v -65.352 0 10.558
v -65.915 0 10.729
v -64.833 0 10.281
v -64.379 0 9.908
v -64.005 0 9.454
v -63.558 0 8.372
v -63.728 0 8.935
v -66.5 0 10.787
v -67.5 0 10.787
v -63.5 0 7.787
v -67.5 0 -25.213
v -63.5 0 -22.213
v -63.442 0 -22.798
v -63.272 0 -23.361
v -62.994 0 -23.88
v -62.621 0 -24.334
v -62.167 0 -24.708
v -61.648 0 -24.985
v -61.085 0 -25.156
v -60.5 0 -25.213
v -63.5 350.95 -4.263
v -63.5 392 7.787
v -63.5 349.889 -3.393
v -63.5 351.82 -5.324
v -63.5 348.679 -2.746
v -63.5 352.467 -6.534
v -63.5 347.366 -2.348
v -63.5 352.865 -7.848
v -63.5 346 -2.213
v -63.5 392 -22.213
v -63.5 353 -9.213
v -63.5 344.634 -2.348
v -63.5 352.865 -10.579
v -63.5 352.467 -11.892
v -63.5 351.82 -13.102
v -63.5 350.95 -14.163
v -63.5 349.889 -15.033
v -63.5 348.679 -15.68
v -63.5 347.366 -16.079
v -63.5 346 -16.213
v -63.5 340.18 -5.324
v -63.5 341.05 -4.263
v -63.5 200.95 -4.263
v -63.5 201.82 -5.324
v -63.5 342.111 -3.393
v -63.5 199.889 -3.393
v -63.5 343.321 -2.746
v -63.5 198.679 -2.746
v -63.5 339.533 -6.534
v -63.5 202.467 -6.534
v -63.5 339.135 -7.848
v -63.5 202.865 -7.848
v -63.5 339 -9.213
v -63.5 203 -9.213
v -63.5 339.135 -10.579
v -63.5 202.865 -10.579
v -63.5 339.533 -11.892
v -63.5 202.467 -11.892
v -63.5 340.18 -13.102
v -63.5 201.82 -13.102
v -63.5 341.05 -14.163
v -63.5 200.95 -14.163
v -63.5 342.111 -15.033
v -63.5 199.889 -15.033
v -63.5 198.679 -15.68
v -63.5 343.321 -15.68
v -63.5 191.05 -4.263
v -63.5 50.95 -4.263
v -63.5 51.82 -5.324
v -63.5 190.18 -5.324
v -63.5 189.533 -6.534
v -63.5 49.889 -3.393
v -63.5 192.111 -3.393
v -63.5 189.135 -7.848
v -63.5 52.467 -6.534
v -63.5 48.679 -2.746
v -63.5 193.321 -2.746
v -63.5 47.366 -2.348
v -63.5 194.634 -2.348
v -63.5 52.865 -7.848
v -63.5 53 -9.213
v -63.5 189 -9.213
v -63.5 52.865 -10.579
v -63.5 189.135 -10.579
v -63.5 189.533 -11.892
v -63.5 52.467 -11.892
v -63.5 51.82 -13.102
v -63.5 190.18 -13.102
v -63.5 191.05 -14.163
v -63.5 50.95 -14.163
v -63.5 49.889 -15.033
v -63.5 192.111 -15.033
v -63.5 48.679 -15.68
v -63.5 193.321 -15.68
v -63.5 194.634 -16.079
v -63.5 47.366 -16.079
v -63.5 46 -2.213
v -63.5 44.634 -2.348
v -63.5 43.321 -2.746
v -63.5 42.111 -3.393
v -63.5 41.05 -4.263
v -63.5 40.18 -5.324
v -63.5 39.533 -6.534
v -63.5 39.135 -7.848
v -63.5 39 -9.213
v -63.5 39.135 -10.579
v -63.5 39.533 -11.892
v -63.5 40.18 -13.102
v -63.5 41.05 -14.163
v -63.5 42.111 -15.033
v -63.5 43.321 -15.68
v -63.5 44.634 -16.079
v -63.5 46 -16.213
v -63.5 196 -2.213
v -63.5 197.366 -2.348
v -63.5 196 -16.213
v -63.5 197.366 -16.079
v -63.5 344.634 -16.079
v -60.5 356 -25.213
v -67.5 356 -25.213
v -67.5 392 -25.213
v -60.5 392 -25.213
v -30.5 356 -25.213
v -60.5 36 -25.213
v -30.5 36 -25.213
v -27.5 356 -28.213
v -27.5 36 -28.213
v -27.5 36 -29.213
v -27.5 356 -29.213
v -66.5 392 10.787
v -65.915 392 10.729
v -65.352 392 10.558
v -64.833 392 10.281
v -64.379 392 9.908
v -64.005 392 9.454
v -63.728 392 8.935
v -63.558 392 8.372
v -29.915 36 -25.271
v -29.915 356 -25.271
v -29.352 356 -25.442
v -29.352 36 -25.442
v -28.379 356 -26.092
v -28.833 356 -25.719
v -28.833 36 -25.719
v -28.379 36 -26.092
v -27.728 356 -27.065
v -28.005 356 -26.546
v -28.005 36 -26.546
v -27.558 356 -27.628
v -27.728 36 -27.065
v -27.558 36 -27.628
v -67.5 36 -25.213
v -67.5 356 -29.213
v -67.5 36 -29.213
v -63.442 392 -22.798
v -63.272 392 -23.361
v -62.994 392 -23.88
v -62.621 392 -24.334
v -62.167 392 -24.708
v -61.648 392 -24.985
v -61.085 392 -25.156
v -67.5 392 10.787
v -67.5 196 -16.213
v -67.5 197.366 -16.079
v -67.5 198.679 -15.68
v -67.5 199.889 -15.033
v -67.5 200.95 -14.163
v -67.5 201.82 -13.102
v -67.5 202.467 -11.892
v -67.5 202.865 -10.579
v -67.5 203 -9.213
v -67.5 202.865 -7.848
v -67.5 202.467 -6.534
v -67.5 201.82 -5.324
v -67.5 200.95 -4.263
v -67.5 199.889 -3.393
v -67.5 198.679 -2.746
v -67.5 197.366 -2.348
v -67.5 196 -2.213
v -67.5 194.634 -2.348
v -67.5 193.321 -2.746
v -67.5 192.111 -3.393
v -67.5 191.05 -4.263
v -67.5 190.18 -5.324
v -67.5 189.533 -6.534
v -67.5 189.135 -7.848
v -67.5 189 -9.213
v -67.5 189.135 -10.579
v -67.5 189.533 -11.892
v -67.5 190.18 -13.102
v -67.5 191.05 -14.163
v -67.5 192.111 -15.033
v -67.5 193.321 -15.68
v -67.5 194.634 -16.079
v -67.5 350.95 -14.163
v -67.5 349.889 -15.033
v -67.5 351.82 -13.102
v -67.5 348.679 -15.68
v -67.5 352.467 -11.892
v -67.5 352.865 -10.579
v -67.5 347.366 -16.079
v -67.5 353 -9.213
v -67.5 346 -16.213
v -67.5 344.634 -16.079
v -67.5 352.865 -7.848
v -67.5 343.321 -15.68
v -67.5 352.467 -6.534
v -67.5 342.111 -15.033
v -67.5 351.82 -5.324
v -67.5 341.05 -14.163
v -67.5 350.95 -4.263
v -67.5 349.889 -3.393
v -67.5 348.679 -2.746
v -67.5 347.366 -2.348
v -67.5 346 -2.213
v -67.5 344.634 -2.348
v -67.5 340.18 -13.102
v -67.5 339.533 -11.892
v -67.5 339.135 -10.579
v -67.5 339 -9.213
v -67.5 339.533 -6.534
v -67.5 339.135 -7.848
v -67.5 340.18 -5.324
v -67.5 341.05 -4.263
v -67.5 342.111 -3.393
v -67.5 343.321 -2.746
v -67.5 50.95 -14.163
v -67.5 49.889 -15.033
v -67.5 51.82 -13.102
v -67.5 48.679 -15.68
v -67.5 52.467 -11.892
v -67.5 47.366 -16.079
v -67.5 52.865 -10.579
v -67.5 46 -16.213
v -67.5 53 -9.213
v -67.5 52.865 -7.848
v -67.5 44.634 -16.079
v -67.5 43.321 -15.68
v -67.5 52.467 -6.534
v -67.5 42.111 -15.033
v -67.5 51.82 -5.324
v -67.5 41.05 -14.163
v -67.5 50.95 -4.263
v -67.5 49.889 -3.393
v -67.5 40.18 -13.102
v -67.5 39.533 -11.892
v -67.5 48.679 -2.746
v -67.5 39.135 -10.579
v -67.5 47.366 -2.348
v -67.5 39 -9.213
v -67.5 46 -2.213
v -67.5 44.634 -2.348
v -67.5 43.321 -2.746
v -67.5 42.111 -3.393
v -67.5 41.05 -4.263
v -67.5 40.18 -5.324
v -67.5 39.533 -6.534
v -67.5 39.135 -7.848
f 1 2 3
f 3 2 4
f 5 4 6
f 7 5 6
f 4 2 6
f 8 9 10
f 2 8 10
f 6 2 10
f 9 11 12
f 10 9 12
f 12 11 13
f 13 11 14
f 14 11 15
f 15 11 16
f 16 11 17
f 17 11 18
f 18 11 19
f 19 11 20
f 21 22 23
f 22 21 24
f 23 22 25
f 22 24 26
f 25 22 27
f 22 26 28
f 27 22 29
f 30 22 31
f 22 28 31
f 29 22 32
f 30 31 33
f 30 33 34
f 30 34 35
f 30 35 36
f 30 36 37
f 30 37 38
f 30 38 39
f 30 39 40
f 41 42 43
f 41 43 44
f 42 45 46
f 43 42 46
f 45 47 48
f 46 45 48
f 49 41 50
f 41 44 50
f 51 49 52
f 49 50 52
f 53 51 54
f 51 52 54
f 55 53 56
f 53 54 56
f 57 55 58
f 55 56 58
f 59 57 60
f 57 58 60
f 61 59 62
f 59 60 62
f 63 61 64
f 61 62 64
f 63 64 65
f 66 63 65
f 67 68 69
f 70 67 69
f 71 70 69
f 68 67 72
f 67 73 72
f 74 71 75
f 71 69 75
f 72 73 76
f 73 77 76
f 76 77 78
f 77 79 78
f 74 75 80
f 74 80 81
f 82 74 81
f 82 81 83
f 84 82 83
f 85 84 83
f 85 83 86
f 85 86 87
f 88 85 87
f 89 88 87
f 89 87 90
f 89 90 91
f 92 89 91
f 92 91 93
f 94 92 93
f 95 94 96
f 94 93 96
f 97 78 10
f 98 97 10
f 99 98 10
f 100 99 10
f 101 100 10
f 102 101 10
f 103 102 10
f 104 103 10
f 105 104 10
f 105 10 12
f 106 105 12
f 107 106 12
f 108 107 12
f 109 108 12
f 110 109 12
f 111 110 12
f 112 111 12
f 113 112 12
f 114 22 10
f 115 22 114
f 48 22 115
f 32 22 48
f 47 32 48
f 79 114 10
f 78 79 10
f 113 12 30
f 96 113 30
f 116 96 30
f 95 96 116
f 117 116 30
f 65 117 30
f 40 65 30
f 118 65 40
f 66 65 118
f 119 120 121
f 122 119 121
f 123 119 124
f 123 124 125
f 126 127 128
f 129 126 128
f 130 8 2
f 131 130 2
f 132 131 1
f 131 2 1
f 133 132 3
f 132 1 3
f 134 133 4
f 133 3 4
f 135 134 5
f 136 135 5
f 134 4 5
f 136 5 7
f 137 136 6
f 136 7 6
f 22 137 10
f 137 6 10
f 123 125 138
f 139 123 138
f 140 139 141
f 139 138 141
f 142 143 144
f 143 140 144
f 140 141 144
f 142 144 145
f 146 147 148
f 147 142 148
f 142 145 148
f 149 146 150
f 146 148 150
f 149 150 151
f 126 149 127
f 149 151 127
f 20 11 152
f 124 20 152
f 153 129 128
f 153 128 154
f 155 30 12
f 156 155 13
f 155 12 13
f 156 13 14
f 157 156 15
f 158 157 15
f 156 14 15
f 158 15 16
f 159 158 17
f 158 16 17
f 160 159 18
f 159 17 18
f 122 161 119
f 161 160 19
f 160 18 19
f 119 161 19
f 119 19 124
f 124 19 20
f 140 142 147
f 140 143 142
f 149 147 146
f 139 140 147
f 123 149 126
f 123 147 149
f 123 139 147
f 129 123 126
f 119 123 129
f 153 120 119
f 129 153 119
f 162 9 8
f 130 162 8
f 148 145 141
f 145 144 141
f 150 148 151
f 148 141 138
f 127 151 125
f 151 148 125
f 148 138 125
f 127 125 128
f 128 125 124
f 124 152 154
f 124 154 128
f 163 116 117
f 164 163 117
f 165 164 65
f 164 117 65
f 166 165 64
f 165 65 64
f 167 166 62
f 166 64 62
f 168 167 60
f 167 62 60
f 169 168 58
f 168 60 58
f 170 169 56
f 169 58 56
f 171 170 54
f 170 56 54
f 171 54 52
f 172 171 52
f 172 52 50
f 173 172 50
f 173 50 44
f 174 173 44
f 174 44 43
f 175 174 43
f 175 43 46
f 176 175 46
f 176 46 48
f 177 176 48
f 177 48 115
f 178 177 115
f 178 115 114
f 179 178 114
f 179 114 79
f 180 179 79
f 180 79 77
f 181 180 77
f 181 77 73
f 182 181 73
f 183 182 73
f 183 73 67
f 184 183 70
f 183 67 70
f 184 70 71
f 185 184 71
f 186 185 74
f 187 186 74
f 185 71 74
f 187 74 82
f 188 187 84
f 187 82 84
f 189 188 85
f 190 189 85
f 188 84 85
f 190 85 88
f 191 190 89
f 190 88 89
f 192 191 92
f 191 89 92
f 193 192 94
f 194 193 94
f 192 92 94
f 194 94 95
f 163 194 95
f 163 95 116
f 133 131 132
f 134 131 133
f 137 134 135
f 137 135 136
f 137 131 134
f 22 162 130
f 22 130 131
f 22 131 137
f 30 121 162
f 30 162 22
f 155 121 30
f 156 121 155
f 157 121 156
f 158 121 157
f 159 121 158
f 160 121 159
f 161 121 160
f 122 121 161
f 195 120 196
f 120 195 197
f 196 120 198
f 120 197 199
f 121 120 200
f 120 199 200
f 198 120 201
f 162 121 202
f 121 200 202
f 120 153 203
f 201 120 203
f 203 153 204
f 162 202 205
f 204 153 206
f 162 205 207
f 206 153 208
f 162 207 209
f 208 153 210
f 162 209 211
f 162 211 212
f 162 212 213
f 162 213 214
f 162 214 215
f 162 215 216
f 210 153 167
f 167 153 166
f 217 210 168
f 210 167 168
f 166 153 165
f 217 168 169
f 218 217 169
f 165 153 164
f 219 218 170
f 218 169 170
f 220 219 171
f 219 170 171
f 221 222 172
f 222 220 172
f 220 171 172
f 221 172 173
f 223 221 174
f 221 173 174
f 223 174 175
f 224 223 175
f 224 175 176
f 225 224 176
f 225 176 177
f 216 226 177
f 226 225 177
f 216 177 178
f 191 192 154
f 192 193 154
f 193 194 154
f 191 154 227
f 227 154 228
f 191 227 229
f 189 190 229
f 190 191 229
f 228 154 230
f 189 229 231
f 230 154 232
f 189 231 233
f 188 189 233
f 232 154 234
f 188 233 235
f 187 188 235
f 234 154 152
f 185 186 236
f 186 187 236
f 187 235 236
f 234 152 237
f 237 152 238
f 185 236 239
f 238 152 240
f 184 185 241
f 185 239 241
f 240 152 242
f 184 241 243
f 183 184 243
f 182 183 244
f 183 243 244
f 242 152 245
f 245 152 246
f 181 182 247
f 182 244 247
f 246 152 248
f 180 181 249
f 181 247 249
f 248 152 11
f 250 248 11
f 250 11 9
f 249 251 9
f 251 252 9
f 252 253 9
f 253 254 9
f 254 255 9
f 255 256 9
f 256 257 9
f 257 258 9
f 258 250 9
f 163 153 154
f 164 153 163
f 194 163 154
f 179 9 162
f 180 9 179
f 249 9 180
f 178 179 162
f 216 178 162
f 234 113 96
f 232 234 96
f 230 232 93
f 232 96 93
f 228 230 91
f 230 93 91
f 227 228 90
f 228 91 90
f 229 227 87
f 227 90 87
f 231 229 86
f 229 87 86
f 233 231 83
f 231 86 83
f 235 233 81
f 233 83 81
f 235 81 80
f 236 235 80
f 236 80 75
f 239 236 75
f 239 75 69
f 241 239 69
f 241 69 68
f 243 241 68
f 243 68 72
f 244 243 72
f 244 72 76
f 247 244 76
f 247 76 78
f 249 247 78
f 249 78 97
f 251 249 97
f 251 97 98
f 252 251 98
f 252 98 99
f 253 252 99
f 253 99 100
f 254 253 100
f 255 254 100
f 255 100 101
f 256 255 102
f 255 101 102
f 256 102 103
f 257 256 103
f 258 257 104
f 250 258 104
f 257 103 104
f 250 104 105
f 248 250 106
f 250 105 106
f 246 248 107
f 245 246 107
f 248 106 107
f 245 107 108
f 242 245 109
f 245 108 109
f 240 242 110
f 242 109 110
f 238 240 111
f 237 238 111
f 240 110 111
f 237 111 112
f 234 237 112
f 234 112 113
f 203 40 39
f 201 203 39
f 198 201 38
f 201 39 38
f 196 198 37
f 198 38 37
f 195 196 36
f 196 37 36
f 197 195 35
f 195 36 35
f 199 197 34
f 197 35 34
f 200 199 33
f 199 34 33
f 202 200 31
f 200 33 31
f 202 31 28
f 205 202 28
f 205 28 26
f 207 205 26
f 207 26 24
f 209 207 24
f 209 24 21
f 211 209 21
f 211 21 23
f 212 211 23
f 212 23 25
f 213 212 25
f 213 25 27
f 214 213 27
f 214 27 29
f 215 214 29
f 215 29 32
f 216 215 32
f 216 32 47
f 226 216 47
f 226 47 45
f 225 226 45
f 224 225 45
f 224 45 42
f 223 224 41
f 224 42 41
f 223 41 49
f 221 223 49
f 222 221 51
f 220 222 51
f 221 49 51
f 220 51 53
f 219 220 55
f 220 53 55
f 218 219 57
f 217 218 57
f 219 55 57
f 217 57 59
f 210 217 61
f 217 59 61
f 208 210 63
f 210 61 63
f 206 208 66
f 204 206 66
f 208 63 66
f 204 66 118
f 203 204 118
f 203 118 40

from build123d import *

# Parameters (mm, degrees)
BOSS_EXTRUDE1_DEPTH     = 392
CUT_EXTRUDE1_DEPTH      = 395.732071568
CUT_EXTRUDE1_DEPTH_BACK = 395.732071568
SKETCH2_W               = 4
SKETCH2_H               = 36
SKETCH3_R               = 7
CUT_EXTRUDE2_DEPTH      = 10


with BuildPart() as part:
    # Sketch1 → Boss-Extrude1 (new body)
    with BuildSketch(Plane(origin=(0, 0, 0), x_dir=(1, 0, 0), z_dir=(0, 1, 0))):
        with BuildLine():
            Line((-27.499872145, 29.213153277), (-67.499872145, 29.213153277))
            Line((-67.499872145, 29.213153277), (-67.499872145, -10.786846723))
            Line((-67.499872145, -10.786846723), (-66.499872145, -10.786846723))
            ThreePointArc((-66.499872145, -10.786846723), (-64.378551801, -9.908167067), (-63.499872145, -7.786846723))
            Line((-63.499872145, -7.786846723), (-63.499872145, 22.213153277))
            ThreePointArc((-63.499872145, 22.213153277), (-62.621192489, 24.334473621), (-60.499872145, 25.213153277))
            Line((-60.499872145, 25.213153277), (-30.499872145, 25.213153277))
            ThreePointArc((-30.499872145, 25.213153277), (-28.378551801, 26.091832933), (-27.499872145, 28.213153277))
            Line((-27.499872145, 28.213153277), (-27.499872145, 29.213153277))
        make_face()
    extrude(amount=BOSS_EXTRUDE1_DEPTH)

    # Sketch2 → Cut-Extrude1 (cut, two sides: drawn at the far end of the back side and taken through both)
    with BuildSketch(Plane(origin=(-63.499872145, 0, 0), x_dir=(0, 0, -1), z_dir=(1, 0, 0)).offset(-CUT_EXTRUDE1_DEPTH_BACK)):
        with Locations((27.213153277, 374)):
            Rectangle(SKETCH2_W, SKETCH2_H)
        with Locations((27.213153277, 18)):
            Rectangle(SKETCH2_W, SKETCH2_H)
    extrude(amount=CUT_EXTRUDE1_DEPTH + CUT_EXTRUDE1_DEPTH_BACK, mode=Mode.SUBTRACT)

    # Sketch3 → Cut-Extrude2 (cut)
    with BuildSketch(Plane(origin=(-63.499872145, 0, 0), x_dir=(0, 0, -1), z_dir=(1, 0, 0))):
        with Locations((9.213153277, 196)):
            Circle(SKETCH3_R)
        with Locations((9.213153277, 46)):
            Circle(SKETCH3_R)
        with Locations((9.213153277, 346)):
            Circle(SKETCH3_R)
    extrude(amount=-CUT_EXTRUDE2_DEPTH, mode=Mode.SUBTRACT)


solid = part.part
